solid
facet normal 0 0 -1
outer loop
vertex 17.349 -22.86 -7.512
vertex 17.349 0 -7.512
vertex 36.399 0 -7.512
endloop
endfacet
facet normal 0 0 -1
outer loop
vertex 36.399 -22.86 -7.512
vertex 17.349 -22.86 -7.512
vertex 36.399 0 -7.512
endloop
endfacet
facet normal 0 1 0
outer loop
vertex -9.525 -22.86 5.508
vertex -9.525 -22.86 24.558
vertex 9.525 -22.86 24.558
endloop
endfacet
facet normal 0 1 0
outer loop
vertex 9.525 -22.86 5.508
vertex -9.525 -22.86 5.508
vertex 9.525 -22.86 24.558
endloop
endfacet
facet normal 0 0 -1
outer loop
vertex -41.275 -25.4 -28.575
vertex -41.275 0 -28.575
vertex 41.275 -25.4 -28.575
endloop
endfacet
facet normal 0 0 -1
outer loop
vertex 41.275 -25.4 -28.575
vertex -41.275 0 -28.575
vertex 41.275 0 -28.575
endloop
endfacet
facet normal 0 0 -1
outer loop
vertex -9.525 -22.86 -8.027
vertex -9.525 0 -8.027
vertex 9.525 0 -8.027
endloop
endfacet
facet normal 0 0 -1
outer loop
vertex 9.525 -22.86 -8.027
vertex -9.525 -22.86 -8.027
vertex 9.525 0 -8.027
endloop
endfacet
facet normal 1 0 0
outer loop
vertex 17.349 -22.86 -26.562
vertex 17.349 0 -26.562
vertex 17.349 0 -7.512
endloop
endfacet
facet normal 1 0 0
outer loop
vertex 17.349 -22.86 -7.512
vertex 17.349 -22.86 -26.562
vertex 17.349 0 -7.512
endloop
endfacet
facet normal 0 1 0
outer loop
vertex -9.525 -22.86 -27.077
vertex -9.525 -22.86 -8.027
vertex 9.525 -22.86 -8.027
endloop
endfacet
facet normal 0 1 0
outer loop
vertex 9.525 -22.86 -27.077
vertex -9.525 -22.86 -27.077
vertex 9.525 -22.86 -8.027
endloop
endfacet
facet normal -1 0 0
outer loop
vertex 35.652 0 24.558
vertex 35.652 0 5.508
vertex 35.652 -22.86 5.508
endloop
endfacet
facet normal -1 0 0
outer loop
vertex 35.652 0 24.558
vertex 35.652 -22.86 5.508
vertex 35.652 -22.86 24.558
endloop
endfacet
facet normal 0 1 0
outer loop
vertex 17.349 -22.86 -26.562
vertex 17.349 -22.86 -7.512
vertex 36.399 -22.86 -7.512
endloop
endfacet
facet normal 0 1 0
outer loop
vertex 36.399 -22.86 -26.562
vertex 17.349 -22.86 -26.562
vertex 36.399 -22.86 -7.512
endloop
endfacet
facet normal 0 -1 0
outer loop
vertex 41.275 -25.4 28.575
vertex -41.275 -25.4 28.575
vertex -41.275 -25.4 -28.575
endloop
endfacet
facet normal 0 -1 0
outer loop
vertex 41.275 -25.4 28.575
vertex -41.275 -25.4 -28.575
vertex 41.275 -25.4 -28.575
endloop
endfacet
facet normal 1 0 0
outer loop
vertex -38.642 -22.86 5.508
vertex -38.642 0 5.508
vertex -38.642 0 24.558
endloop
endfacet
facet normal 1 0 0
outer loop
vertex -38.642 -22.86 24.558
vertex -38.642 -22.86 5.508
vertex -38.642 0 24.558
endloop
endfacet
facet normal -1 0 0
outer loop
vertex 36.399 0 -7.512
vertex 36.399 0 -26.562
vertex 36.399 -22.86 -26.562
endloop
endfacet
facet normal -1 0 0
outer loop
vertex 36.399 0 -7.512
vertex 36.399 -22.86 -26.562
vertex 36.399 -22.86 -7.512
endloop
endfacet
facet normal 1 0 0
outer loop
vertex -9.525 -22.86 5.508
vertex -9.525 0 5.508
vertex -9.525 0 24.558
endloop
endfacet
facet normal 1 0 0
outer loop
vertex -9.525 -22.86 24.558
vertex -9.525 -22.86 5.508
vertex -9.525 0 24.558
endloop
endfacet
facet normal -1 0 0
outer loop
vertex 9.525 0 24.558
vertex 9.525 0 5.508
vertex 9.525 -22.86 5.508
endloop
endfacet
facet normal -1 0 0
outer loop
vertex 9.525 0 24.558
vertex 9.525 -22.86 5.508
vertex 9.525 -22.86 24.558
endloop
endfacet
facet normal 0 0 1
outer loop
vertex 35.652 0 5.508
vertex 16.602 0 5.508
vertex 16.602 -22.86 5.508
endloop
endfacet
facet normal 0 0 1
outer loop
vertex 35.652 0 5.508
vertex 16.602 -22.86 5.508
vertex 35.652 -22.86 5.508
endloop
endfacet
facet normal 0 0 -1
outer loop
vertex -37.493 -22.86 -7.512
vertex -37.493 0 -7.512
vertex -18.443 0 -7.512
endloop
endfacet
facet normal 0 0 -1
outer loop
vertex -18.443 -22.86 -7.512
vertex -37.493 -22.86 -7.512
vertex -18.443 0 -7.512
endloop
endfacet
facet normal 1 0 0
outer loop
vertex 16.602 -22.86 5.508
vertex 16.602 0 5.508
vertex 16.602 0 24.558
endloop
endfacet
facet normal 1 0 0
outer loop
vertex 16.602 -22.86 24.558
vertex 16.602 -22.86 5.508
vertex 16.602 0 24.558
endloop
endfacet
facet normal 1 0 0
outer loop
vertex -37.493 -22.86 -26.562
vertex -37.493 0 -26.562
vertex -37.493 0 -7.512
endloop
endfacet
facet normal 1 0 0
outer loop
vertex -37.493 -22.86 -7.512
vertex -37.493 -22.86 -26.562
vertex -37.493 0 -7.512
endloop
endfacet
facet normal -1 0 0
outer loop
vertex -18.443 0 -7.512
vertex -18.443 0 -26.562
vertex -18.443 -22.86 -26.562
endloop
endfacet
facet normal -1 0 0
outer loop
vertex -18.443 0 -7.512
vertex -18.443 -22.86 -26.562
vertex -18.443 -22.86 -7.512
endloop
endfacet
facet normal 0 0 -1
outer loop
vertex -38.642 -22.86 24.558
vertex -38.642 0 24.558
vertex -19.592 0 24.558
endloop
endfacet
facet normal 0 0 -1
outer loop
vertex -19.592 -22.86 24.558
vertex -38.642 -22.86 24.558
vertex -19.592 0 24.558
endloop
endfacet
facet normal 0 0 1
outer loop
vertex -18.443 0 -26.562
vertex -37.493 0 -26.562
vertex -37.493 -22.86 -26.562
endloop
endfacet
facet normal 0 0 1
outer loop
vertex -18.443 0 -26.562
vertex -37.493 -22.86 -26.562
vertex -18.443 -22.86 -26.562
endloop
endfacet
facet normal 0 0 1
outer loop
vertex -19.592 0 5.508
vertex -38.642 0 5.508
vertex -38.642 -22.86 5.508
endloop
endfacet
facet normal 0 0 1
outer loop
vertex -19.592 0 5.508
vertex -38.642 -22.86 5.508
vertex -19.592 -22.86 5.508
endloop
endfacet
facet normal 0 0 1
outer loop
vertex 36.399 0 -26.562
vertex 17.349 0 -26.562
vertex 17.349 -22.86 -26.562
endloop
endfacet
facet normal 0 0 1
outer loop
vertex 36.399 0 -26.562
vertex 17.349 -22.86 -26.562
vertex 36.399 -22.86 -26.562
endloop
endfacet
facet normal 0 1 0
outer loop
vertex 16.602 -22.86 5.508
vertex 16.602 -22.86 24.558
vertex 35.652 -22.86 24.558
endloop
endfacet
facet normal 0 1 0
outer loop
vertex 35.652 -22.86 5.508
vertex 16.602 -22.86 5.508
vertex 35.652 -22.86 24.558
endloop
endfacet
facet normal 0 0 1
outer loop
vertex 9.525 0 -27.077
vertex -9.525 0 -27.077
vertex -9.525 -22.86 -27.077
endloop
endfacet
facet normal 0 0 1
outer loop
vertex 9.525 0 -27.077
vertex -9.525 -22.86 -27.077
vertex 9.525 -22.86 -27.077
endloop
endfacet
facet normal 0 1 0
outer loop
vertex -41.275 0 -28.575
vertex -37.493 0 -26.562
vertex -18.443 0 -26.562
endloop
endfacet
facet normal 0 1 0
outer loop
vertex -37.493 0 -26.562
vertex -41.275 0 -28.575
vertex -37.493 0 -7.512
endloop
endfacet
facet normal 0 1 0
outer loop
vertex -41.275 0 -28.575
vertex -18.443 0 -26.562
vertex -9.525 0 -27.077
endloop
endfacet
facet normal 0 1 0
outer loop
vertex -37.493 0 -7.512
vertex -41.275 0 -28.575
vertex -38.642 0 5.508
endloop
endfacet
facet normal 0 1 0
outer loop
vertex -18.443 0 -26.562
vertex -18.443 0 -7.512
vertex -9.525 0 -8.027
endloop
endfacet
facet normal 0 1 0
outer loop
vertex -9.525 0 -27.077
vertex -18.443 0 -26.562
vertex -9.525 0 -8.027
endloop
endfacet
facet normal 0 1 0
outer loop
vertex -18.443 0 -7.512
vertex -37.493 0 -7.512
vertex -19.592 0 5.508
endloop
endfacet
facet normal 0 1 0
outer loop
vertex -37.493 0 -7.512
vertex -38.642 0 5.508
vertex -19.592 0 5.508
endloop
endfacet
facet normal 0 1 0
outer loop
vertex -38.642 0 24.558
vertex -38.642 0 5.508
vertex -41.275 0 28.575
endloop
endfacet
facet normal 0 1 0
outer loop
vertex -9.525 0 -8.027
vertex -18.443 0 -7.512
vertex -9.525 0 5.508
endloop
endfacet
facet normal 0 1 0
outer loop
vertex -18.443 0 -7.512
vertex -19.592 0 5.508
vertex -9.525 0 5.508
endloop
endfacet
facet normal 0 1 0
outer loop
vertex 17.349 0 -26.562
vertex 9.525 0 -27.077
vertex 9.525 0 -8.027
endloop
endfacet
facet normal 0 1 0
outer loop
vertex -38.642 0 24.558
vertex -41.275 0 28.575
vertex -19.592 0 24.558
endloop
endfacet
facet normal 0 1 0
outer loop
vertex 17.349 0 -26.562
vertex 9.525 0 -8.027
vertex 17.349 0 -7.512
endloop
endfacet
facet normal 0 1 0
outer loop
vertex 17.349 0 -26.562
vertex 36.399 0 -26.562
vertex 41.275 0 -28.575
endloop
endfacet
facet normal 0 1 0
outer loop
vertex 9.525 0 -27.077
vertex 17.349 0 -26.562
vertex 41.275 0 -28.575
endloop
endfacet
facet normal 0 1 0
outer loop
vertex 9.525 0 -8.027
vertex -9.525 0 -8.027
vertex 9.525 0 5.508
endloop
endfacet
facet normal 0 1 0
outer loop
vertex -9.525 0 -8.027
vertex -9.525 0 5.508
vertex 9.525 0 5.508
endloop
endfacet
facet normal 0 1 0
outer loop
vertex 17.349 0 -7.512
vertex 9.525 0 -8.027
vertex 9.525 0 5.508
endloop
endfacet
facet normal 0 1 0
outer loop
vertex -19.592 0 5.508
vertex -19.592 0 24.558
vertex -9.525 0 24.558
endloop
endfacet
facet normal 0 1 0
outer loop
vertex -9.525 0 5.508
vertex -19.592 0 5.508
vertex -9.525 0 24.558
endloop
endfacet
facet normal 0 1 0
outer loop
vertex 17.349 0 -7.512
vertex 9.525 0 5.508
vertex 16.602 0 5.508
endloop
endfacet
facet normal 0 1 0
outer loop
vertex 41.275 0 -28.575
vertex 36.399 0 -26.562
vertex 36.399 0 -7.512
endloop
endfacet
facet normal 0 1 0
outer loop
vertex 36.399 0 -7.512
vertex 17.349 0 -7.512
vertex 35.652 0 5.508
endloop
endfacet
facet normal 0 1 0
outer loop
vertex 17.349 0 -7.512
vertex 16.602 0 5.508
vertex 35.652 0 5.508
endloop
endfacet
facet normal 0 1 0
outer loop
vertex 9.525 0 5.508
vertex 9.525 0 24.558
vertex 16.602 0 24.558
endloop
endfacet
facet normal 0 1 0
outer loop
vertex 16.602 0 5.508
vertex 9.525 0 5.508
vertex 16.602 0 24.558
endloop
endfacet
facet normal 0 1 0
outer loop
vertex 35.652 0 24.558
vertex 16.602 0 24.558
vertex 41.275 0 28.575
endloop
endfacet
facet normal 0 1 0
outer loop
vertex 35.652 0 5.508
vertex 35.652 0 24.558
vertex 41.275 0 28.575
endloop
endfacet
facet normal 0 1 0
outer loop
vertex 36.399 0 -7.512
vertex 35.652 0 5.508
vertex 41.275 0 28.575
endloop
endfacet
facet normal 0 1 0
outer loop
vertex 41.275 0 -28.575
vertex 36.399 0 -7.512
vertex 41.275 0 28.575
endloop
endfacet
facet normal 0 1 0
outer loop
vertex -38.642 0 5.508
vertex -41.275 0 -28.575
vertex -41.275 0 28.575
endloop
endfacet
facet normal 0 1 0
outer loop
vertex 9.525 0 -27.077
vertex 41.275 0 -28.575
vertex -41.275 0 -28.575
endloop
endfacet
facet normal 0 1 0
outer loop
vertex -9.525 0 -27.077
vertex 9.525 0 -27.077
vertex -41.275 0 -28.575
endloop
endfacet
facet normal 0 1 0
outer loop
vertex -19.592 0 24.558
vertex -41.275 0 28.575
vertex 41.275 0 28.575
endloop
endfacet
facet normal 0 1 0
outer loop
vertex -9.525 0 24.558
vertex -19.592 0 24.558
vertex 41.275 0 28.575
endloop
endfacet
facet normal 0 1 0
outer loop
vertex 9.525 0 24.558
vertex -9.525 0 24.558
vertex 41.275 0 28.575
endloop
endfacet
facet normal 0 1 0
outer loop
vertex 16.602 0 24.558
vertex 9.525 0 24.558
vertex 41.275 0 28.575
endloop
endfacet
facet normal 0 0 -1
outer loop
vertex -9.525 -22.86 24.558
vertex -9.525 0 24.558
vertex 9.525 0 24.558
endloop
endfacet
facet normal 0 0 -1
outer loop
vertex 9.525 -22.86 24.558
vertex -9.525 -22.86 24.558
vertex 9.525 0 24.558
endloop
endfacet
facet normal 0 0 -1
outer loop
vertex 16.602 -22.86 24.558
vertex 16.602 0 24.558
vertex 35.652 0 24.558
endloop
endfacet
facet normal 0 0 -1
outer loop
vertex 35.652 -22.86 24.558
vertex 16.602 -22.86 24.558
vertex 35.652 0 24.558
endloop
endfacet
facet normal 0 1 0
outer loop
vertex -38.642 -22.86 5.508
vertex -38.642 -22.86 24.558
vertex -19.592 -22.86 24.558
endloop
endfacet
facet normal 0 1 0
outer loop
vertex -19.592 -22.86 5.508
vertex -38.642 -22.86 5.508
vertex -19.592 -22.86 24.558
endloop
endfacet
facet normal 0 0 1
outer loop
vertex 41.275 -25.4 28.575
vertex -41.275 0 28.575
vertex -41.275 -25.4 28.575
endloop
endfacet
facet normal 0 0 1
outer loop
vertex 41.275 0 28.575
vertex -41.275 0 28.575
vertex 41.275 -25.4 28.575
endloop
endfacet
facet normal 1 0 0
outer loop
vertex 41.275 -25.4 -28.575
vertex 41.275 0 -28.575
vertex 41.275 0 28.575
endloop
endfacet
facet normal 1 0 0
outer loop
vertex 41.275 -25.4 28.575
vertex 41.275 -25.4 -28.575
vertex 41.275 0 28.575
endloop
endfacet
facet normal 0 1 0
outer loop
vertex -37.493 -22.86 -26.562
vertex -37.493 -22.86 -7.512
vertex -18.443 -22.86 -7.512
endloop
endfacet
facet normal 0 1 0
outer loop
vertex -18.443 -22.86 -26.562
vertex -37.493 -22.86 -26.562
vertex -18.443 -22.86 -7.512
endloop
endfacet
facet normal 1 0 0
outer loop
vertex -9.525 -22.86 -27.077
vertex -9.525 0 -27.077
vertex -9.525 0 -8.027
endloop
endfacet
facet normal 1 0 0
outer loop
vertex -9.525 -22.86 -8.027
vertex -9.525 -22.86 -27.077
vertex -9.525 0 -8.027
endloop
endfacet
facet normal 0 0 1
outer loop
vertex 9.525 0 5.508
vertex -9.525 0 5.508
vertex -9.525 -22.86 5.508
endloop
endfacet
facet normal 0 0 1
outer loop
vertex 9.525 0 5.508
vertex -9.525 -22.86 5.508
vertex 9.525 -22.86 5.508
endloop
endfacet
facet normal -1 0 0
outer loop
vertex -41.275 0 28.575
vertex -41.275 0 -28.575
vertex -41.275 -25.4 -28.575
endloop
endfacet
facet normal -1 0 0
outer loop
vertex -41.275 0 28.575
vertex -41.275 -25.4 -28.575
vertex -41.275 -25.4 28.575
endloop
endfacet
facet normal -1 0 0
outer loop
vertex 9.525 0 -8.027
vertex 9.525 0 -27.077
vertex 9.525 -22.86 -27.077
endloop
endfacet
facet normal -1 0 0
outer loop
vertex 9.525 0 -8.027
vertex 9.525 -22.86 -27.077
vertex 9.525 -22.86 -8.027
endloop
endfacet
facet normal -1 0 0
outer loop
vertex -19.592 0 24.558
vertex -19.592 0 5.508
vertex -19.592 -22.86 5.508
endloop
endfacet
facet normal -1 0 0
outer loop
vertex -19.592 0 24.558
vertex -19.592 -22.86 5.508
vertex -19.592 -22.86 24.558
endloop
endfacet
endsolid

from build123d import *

# Parameters (mm, degrees)
F0_W     = 82.55
F0_H     = 57.15
F0_W_2   = 76.2
F0_H_2   = 50.8
F1_DEPTH = 25.4
F2_W     = 19.05
F2_H     = 19.05
F3_DEPTH = 22.86


with BuildPart() as f1:
    # F0 (on Front) → F1 (new body)
    with BuildSketch(Plane.XZ):
        Rectangle(F0_W, F0_H)
        Rectangle(F0_W_2, F0_H_2, mode=Mode.SUBTRACT)
        Rectangle(F0_W_2, F0_H_2)
    extrude(amount=F1_DEPTH)

    # F2 (on Front) → F3 (cut)
    with BuildSketch(Plane.XZ):
        with Locations((26.126538, 15.033415)):
            Rectangle(F2_W, F2_H)
        with Locations((0, 15.033415)):
            Rectangle(F2_W, F2_H)
        with Locations((-29.117243, 15.033415)):
            Rectangle(F2_W, F2_H)
        with Locations((-27.96792, -17.036804)):
            Rectangle(F2_W, F2_H)
        with Locations((0, -17.552111)):
            Rectangle(F2_W, F2_H)
        with Locations((26.873696, -17.036807)):
            Rectangle(F2_W, F2_H)
    extrude(amount=F3_DEPTH, mode=Mode.SUBTRACT)


solid = f1.part
